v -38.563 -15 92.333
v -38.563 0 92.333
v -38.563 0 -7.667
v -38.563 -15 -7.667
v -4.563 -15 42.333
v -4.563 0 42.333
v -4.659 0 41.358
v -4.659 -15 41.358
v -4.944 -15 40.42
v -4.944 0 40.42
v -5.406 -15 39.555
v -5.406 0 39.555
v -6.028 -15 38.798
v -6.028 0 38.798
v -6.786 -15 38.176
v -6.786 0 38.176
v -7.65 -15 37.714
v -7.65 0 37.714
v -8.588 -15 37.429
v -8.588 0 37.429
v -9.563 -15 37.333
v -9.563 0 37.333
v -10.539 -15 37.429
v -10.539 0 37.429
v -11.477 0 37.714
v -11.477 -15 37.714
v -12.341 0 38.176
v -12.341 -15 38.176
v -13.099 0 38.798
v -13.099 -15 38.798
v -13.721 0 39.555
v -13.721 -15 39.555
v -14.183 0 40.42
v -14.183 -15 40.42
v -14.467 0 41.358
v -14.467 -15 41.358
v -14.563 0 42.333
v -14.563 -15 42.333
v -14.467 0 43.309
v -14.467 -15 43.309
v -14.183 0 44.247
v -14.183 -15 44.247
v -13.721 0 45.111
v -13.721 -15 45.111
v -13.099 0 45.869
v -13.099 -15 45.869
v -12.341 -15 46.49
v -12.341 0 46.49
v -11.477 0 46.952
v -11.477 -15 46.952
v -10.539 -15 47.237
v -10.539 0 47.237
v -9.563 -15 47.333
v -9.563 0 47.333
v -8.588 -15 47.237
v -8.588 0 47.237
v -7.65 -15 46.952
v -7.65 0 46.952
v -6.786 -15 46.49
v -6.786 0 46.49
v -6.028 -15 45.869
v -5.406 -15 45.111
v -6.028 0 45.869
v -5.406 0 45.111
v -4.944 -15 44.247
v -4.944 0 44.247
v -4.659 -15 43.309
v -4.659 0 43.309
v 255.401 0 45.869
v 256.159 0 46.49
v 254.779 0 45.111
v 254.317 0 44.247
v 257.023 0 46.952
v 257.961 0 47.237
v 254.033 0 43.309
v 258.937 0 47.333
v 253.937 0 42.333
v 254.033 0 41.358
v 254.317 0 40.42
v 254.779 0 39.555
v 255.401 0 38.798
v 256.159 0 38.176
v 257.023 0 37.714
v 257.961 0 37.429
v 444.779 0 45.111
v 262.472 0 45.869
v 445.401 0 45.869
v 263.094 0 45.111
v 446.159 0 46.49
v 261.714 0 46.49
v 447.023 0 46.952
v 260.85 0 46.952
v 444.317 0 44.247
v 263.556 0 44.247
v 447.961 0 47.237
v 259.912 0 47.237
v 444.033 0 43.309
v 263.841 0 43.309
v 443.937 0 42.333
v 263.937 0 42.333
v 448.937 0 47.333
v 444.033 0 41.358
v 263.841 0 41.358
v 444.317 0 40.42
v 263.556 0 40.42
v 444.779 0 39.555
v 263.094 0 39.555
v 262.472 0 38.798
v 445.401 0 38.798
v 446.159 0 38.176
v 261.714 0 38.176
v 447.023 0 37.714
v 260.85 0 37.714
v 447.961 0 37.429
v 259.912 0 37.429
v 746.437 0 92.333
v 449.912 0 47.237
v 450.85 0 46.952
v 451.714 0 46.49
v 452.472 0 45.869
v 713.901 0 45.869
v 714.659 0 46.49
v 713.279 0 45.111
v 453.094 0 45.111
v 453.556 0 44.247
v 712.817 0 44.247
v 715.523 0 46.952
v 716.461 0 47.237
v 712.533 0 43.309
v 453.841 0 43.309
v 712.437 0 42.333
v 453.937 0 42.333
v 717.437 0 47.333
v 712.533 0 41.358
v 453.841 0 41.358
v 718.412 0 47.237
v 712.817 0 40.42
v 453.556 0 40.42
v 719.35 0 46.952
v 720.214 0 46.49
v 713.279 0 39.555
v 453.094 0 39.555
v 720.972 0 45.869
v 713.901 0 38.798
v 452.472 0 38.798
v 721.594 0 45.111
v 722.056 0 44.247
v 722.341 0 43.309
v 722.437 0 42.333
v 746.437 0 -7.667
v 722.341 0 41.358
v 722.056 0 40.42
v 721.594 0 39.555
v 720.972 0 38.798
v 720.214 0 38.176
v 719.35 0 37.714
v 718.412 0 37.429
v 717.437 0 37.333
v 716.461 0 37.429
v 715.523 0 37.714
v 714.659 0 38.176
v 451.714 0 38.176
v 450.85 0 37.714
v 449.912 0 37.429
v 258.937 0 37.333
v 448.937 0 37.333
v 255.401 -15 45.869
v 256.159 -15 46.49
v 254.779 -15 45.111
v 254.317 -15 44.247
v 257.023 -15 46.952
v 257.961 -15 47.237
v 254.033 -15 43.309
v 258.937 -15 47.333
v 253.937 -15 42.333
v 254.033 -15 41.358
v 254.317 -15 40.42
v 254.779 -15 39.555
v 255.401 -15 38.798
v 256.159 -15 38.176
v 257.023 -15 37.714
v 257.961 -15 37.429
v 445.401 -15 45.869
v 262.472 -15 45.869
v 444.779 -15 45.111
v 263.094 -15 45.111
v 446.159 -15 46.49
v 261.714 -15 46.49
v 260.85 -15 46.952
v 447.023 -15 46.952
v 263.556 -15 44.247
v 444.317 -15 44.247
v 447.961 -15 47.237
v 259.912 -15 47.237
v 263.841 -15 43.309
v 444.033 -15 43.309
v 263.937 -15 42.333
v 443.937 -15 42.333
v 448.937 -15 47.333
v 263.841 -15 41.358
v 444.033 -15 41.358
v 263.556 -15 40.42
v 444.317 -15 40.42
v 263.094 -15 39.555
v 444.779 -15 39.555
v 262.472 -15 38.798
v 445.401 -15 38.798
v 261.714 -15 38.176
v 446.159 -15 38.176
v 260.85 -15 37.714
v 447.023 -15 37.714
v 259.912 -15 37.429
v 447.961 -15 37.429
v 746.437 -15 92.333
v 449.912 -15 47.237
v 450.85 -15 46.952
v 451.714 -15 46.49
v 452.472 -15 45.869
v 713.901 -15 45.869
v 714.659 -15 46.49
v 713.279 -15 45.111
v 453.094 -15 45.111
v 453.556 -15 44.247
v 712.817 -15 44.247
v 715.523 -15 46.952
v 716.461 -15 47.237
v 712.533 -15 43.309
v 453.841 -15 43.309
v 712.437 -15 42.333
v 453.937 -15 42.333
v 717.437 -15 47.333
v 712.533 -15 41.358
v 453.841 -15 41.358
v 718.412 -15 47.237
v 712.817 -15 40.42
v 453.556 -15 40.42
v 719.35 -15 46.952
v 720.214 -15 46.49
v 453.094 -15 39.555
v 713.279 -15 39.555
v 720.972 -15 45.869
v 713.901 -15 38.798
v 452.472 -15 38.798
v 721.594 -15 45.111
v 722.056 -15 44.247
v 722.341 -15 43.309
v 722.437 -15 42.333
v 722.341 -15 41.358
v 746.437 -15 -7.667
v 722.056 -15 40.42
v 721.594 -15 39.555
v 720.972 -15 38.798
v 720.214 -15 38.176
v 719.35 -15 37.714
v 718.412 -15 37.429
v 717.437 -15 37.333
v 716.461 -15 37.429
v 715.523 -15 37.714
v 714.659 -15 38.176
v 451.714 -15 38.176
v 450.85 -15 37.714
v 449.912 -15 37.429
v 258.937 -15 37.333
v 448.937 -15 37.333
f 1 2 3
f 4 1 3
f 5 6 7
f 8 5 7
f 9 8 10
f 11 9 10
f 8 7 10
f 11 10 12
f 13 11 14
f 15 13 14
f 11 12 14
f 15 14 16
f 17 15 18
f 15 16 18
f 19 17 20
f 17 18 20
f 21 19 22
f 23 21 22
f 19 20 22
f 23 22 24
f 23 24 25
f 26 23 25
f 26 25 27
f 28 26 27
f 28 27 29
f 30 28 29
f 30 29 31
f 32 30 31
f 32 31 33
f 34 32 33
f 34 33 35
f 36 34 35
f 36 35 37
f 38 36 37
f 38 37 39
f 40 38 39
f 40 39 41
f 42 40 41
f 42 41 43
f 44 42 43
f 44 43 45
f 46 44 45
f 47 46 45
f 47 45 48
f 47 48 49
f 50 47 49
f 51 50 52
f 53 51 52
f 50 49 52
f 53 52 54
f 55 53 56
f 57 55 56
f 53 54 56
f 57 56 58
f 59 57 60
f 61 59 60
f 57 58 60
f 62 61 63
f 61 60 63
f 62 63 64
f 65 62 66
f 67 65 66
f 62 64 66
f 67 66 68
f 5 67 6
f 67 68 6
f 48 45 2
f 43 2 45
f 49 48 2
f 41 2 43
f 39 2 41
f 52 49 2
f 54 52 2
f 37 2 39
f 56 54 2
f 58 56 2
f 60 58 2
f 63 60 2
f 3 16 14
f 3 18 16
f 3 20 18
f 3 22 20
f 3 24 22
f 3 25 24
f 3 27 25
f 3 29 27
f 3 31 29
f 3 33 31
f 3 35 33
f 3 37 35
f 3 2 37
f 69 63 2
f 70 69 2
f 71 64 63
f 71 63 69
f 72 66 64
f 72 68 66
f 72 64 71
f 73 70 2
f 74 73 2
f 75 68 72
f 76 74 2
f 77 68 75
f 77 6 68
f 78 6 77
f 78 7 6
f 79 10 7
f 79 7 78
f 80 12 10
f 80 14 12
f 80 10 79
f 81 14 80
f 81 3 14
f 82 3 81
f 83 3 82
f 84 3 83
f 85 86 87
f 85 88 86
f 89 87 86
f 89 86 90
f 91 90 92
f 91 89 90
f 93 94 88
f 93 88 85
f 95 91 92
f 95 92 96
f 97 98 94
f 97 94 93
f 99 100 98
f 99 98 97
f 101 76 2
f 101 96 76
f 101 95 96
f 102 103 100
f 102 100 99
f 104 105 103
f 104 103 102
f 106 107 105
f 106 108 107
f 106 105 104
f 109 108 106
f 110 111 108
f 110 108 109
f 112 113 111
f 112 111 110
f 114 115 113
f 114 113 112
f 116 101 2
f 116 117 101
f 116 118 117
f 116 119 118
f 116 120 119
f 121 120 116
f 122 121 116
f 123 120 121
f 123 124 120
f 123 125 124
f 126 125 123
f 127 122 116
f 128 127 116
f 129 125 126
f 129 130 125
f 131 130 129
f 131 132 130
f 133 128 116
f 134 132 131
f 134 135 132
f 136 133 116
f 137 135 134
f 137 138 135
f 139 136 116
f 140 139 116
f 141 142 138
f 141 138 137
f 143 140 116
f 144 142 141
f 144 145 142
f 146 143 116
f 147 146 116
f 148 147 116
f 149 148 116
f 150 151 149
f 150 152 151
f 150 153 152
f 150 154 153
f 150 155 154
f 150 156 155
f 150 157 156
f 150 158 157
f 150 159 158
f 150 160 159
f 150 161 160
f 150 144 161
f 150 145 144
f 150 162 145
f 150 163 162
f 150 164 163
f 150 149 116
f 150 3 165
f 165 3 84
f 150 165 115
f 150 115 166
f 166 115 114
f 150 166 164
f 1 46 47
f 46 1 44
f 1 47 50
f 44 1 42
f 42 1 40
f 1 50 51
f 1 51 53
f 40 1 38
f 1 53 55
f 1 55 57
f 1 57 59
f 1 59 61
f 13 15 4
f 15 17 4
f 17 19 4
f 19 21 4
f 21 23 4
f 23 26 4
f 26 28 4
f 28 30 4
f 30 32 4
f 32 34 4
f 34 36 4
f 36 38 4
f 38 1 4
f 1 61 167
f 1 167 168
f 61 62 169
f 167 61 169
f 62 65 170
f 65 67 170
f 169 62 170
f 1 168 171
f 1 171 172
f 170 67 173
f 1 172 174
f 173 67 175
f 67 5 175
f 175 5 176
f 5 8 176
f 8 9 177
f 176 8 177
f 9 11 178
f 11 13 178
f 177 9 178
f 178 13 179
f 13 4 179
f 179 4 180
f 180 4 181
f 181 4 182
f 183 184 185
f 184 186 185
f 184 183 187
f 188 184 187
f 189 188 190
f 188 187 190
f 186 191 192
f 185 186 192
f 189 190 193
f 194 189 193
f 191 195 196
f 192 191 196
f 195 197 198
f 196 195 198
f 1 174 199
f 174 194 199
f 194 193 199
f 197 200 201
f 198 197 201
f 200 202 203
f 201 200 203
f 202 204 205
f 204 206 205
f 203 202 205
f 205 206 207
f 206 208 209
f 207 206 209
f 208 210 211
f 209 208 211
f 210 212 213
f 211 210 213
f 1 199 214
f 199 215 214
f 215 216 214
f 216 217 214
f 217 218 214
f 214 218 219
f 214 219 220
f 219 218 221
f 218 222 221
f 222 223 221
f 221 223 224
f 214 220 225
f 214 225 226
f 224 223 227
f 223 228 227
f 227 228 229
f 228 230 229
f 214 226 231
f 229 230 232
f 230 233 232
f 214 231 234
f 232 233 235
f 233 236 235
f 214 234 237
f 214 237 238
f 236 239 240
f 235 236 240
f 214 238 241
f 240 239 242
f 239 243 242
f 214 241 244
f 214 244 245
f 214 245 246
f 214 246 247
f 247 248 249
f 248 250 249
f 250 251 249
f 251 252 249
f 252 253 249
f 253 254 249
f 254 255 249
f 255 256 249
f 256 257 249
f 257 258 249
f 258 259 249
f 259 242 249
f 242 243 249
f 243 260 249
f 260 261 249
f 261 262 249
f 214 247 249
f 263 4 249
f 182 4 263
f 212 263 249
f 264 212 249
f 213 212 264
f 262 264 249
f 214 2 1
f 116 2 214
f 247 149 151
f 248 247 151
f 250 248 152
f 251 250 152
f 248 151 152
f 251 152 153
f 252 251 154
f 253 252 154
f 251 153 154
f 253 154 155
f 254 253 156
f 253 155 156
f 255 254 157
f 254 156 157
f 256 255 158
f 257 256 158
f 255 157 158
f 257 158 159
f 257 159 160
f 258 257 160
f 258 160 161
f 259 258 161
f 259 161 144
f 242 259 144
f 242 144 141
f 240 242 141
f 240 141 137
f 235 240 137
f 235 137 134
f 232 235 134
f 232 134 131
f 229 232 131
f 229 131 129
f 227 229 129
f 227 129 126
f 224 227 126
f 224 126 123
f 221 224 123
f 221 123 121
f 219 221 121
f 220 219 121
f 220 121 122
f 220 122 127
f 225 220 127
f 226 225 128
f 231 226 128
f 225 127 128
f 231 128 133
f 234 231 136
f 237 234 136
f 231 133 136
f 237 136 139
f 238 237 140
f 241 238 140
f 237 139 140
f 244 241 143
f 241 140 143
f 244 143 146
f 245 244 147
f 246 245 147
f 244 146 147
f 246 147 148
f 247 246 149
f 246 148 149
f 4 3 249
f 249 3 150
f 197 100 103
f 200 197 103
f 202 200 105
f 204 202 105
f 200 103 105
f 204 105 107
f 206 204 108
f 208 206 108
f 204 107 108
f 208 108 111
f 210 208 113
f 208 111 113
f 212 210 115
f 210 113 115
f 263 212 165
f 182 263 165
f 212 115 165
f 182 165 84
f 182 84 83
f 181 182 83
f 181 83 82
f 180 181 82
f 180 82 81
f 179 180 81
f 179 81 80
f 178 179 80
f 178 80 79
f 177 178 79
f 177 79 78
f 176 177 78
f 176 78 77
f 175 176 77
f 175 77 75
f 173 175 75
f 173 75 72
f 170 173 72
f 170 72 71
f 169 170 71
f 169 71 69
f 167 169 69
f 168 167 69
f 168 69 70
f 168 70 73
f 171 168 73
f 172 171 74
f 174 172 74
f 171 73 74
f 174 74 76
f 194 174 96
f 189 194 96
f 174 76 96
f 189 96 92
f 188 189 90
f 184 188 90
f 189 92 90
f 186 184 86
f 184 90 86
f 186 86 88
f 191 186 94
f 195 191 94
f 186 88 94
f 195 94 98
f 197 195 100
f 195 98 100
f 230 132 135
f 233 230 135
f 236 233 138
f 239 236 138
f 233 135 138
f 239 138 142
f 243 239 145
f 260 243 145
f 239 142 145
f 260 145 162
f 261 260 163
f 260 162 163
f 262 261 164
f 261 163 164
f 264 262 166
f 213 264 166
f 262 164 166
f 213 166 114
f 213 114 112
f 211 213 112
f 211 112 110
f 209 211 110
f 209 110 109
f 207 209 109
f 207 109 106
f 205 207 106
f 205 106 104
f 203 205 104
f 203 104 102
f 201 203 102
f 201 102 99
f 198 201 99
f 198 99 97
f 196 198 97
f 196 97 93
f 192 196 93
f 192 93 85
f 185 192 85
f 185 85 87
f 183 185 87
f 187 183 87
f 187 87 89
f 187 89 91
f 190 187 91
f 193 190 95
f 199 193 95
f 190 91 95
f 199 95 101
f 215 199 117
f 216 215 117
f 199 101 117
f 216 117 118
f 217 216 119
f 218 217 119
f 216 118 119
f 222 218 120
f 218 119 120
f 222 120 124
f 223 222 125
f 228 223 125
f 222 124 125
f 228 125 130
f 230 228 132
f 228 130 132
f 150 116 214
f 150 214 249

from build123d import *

# Parameters (mm, degrees)
CROQUIS1_W              = 785
CROQUIS1_H              = 100
SALIENTE_EXTRUIR1_DEPTH = 15
CROQUIS5_R              = 5
CORTAR_EXTRUIR4_DEPTH   = 16
CROQUIS6_R              = 5
CORTAR_EXTRUIR5_DEPTH   = 16


with BuildPart() as part:
    # Croquis1 → Saliente-Extruir1 (new body)
    with BuildSketch(Plane(origin=(0, 0, 0), x_dir=(1, 0, 0), z_dir=(0, 1, 0))):
        with Locations((353.936588921, -42.333090379)):
            Rectangle(CROQUIS1_W, CROQUIS1_H)
    extrude(amount=-SALIENTE_EXTRUIR1_DEPTH)

    # Croquis5 → Cortar-Extruir4 (cut, through all)
    with BuildSketch(Plane(origin=(0, 0, 0), x_dir=(1, 0, 0), z_dir=(0, 1, 0))):
        with Locations((258.936588921, -42.333090379)):
            Circle(CROQUIS5_R)
        with Locations((448.936588921, -42.333090379)):
            Circle(CROQUIS5_R)
    extrude(amount=-CORTAR_EXTRUIR4_DEPTH, mode=Mode.SUBTRACT)

    # Croquis6 → Cortar-Extruir5 (cut, through all)
    with BuildSketch(Plane(origin=(0, 0, 0), x_dir=(1, 0, 0), z_dir=(0, 1, 0))):
        with Locations((-9.563411079, -42.333090379)):
            Circle(CROQUIS6_R)
        with Locations((717.436588921, -42.333090379)):
            Circle(CROQUIS6_R)
    extrude(amount=-CORTAR_EXTRUIR5_DEPTH, mode=Mode.SUBTRACT)


solid = part.part
